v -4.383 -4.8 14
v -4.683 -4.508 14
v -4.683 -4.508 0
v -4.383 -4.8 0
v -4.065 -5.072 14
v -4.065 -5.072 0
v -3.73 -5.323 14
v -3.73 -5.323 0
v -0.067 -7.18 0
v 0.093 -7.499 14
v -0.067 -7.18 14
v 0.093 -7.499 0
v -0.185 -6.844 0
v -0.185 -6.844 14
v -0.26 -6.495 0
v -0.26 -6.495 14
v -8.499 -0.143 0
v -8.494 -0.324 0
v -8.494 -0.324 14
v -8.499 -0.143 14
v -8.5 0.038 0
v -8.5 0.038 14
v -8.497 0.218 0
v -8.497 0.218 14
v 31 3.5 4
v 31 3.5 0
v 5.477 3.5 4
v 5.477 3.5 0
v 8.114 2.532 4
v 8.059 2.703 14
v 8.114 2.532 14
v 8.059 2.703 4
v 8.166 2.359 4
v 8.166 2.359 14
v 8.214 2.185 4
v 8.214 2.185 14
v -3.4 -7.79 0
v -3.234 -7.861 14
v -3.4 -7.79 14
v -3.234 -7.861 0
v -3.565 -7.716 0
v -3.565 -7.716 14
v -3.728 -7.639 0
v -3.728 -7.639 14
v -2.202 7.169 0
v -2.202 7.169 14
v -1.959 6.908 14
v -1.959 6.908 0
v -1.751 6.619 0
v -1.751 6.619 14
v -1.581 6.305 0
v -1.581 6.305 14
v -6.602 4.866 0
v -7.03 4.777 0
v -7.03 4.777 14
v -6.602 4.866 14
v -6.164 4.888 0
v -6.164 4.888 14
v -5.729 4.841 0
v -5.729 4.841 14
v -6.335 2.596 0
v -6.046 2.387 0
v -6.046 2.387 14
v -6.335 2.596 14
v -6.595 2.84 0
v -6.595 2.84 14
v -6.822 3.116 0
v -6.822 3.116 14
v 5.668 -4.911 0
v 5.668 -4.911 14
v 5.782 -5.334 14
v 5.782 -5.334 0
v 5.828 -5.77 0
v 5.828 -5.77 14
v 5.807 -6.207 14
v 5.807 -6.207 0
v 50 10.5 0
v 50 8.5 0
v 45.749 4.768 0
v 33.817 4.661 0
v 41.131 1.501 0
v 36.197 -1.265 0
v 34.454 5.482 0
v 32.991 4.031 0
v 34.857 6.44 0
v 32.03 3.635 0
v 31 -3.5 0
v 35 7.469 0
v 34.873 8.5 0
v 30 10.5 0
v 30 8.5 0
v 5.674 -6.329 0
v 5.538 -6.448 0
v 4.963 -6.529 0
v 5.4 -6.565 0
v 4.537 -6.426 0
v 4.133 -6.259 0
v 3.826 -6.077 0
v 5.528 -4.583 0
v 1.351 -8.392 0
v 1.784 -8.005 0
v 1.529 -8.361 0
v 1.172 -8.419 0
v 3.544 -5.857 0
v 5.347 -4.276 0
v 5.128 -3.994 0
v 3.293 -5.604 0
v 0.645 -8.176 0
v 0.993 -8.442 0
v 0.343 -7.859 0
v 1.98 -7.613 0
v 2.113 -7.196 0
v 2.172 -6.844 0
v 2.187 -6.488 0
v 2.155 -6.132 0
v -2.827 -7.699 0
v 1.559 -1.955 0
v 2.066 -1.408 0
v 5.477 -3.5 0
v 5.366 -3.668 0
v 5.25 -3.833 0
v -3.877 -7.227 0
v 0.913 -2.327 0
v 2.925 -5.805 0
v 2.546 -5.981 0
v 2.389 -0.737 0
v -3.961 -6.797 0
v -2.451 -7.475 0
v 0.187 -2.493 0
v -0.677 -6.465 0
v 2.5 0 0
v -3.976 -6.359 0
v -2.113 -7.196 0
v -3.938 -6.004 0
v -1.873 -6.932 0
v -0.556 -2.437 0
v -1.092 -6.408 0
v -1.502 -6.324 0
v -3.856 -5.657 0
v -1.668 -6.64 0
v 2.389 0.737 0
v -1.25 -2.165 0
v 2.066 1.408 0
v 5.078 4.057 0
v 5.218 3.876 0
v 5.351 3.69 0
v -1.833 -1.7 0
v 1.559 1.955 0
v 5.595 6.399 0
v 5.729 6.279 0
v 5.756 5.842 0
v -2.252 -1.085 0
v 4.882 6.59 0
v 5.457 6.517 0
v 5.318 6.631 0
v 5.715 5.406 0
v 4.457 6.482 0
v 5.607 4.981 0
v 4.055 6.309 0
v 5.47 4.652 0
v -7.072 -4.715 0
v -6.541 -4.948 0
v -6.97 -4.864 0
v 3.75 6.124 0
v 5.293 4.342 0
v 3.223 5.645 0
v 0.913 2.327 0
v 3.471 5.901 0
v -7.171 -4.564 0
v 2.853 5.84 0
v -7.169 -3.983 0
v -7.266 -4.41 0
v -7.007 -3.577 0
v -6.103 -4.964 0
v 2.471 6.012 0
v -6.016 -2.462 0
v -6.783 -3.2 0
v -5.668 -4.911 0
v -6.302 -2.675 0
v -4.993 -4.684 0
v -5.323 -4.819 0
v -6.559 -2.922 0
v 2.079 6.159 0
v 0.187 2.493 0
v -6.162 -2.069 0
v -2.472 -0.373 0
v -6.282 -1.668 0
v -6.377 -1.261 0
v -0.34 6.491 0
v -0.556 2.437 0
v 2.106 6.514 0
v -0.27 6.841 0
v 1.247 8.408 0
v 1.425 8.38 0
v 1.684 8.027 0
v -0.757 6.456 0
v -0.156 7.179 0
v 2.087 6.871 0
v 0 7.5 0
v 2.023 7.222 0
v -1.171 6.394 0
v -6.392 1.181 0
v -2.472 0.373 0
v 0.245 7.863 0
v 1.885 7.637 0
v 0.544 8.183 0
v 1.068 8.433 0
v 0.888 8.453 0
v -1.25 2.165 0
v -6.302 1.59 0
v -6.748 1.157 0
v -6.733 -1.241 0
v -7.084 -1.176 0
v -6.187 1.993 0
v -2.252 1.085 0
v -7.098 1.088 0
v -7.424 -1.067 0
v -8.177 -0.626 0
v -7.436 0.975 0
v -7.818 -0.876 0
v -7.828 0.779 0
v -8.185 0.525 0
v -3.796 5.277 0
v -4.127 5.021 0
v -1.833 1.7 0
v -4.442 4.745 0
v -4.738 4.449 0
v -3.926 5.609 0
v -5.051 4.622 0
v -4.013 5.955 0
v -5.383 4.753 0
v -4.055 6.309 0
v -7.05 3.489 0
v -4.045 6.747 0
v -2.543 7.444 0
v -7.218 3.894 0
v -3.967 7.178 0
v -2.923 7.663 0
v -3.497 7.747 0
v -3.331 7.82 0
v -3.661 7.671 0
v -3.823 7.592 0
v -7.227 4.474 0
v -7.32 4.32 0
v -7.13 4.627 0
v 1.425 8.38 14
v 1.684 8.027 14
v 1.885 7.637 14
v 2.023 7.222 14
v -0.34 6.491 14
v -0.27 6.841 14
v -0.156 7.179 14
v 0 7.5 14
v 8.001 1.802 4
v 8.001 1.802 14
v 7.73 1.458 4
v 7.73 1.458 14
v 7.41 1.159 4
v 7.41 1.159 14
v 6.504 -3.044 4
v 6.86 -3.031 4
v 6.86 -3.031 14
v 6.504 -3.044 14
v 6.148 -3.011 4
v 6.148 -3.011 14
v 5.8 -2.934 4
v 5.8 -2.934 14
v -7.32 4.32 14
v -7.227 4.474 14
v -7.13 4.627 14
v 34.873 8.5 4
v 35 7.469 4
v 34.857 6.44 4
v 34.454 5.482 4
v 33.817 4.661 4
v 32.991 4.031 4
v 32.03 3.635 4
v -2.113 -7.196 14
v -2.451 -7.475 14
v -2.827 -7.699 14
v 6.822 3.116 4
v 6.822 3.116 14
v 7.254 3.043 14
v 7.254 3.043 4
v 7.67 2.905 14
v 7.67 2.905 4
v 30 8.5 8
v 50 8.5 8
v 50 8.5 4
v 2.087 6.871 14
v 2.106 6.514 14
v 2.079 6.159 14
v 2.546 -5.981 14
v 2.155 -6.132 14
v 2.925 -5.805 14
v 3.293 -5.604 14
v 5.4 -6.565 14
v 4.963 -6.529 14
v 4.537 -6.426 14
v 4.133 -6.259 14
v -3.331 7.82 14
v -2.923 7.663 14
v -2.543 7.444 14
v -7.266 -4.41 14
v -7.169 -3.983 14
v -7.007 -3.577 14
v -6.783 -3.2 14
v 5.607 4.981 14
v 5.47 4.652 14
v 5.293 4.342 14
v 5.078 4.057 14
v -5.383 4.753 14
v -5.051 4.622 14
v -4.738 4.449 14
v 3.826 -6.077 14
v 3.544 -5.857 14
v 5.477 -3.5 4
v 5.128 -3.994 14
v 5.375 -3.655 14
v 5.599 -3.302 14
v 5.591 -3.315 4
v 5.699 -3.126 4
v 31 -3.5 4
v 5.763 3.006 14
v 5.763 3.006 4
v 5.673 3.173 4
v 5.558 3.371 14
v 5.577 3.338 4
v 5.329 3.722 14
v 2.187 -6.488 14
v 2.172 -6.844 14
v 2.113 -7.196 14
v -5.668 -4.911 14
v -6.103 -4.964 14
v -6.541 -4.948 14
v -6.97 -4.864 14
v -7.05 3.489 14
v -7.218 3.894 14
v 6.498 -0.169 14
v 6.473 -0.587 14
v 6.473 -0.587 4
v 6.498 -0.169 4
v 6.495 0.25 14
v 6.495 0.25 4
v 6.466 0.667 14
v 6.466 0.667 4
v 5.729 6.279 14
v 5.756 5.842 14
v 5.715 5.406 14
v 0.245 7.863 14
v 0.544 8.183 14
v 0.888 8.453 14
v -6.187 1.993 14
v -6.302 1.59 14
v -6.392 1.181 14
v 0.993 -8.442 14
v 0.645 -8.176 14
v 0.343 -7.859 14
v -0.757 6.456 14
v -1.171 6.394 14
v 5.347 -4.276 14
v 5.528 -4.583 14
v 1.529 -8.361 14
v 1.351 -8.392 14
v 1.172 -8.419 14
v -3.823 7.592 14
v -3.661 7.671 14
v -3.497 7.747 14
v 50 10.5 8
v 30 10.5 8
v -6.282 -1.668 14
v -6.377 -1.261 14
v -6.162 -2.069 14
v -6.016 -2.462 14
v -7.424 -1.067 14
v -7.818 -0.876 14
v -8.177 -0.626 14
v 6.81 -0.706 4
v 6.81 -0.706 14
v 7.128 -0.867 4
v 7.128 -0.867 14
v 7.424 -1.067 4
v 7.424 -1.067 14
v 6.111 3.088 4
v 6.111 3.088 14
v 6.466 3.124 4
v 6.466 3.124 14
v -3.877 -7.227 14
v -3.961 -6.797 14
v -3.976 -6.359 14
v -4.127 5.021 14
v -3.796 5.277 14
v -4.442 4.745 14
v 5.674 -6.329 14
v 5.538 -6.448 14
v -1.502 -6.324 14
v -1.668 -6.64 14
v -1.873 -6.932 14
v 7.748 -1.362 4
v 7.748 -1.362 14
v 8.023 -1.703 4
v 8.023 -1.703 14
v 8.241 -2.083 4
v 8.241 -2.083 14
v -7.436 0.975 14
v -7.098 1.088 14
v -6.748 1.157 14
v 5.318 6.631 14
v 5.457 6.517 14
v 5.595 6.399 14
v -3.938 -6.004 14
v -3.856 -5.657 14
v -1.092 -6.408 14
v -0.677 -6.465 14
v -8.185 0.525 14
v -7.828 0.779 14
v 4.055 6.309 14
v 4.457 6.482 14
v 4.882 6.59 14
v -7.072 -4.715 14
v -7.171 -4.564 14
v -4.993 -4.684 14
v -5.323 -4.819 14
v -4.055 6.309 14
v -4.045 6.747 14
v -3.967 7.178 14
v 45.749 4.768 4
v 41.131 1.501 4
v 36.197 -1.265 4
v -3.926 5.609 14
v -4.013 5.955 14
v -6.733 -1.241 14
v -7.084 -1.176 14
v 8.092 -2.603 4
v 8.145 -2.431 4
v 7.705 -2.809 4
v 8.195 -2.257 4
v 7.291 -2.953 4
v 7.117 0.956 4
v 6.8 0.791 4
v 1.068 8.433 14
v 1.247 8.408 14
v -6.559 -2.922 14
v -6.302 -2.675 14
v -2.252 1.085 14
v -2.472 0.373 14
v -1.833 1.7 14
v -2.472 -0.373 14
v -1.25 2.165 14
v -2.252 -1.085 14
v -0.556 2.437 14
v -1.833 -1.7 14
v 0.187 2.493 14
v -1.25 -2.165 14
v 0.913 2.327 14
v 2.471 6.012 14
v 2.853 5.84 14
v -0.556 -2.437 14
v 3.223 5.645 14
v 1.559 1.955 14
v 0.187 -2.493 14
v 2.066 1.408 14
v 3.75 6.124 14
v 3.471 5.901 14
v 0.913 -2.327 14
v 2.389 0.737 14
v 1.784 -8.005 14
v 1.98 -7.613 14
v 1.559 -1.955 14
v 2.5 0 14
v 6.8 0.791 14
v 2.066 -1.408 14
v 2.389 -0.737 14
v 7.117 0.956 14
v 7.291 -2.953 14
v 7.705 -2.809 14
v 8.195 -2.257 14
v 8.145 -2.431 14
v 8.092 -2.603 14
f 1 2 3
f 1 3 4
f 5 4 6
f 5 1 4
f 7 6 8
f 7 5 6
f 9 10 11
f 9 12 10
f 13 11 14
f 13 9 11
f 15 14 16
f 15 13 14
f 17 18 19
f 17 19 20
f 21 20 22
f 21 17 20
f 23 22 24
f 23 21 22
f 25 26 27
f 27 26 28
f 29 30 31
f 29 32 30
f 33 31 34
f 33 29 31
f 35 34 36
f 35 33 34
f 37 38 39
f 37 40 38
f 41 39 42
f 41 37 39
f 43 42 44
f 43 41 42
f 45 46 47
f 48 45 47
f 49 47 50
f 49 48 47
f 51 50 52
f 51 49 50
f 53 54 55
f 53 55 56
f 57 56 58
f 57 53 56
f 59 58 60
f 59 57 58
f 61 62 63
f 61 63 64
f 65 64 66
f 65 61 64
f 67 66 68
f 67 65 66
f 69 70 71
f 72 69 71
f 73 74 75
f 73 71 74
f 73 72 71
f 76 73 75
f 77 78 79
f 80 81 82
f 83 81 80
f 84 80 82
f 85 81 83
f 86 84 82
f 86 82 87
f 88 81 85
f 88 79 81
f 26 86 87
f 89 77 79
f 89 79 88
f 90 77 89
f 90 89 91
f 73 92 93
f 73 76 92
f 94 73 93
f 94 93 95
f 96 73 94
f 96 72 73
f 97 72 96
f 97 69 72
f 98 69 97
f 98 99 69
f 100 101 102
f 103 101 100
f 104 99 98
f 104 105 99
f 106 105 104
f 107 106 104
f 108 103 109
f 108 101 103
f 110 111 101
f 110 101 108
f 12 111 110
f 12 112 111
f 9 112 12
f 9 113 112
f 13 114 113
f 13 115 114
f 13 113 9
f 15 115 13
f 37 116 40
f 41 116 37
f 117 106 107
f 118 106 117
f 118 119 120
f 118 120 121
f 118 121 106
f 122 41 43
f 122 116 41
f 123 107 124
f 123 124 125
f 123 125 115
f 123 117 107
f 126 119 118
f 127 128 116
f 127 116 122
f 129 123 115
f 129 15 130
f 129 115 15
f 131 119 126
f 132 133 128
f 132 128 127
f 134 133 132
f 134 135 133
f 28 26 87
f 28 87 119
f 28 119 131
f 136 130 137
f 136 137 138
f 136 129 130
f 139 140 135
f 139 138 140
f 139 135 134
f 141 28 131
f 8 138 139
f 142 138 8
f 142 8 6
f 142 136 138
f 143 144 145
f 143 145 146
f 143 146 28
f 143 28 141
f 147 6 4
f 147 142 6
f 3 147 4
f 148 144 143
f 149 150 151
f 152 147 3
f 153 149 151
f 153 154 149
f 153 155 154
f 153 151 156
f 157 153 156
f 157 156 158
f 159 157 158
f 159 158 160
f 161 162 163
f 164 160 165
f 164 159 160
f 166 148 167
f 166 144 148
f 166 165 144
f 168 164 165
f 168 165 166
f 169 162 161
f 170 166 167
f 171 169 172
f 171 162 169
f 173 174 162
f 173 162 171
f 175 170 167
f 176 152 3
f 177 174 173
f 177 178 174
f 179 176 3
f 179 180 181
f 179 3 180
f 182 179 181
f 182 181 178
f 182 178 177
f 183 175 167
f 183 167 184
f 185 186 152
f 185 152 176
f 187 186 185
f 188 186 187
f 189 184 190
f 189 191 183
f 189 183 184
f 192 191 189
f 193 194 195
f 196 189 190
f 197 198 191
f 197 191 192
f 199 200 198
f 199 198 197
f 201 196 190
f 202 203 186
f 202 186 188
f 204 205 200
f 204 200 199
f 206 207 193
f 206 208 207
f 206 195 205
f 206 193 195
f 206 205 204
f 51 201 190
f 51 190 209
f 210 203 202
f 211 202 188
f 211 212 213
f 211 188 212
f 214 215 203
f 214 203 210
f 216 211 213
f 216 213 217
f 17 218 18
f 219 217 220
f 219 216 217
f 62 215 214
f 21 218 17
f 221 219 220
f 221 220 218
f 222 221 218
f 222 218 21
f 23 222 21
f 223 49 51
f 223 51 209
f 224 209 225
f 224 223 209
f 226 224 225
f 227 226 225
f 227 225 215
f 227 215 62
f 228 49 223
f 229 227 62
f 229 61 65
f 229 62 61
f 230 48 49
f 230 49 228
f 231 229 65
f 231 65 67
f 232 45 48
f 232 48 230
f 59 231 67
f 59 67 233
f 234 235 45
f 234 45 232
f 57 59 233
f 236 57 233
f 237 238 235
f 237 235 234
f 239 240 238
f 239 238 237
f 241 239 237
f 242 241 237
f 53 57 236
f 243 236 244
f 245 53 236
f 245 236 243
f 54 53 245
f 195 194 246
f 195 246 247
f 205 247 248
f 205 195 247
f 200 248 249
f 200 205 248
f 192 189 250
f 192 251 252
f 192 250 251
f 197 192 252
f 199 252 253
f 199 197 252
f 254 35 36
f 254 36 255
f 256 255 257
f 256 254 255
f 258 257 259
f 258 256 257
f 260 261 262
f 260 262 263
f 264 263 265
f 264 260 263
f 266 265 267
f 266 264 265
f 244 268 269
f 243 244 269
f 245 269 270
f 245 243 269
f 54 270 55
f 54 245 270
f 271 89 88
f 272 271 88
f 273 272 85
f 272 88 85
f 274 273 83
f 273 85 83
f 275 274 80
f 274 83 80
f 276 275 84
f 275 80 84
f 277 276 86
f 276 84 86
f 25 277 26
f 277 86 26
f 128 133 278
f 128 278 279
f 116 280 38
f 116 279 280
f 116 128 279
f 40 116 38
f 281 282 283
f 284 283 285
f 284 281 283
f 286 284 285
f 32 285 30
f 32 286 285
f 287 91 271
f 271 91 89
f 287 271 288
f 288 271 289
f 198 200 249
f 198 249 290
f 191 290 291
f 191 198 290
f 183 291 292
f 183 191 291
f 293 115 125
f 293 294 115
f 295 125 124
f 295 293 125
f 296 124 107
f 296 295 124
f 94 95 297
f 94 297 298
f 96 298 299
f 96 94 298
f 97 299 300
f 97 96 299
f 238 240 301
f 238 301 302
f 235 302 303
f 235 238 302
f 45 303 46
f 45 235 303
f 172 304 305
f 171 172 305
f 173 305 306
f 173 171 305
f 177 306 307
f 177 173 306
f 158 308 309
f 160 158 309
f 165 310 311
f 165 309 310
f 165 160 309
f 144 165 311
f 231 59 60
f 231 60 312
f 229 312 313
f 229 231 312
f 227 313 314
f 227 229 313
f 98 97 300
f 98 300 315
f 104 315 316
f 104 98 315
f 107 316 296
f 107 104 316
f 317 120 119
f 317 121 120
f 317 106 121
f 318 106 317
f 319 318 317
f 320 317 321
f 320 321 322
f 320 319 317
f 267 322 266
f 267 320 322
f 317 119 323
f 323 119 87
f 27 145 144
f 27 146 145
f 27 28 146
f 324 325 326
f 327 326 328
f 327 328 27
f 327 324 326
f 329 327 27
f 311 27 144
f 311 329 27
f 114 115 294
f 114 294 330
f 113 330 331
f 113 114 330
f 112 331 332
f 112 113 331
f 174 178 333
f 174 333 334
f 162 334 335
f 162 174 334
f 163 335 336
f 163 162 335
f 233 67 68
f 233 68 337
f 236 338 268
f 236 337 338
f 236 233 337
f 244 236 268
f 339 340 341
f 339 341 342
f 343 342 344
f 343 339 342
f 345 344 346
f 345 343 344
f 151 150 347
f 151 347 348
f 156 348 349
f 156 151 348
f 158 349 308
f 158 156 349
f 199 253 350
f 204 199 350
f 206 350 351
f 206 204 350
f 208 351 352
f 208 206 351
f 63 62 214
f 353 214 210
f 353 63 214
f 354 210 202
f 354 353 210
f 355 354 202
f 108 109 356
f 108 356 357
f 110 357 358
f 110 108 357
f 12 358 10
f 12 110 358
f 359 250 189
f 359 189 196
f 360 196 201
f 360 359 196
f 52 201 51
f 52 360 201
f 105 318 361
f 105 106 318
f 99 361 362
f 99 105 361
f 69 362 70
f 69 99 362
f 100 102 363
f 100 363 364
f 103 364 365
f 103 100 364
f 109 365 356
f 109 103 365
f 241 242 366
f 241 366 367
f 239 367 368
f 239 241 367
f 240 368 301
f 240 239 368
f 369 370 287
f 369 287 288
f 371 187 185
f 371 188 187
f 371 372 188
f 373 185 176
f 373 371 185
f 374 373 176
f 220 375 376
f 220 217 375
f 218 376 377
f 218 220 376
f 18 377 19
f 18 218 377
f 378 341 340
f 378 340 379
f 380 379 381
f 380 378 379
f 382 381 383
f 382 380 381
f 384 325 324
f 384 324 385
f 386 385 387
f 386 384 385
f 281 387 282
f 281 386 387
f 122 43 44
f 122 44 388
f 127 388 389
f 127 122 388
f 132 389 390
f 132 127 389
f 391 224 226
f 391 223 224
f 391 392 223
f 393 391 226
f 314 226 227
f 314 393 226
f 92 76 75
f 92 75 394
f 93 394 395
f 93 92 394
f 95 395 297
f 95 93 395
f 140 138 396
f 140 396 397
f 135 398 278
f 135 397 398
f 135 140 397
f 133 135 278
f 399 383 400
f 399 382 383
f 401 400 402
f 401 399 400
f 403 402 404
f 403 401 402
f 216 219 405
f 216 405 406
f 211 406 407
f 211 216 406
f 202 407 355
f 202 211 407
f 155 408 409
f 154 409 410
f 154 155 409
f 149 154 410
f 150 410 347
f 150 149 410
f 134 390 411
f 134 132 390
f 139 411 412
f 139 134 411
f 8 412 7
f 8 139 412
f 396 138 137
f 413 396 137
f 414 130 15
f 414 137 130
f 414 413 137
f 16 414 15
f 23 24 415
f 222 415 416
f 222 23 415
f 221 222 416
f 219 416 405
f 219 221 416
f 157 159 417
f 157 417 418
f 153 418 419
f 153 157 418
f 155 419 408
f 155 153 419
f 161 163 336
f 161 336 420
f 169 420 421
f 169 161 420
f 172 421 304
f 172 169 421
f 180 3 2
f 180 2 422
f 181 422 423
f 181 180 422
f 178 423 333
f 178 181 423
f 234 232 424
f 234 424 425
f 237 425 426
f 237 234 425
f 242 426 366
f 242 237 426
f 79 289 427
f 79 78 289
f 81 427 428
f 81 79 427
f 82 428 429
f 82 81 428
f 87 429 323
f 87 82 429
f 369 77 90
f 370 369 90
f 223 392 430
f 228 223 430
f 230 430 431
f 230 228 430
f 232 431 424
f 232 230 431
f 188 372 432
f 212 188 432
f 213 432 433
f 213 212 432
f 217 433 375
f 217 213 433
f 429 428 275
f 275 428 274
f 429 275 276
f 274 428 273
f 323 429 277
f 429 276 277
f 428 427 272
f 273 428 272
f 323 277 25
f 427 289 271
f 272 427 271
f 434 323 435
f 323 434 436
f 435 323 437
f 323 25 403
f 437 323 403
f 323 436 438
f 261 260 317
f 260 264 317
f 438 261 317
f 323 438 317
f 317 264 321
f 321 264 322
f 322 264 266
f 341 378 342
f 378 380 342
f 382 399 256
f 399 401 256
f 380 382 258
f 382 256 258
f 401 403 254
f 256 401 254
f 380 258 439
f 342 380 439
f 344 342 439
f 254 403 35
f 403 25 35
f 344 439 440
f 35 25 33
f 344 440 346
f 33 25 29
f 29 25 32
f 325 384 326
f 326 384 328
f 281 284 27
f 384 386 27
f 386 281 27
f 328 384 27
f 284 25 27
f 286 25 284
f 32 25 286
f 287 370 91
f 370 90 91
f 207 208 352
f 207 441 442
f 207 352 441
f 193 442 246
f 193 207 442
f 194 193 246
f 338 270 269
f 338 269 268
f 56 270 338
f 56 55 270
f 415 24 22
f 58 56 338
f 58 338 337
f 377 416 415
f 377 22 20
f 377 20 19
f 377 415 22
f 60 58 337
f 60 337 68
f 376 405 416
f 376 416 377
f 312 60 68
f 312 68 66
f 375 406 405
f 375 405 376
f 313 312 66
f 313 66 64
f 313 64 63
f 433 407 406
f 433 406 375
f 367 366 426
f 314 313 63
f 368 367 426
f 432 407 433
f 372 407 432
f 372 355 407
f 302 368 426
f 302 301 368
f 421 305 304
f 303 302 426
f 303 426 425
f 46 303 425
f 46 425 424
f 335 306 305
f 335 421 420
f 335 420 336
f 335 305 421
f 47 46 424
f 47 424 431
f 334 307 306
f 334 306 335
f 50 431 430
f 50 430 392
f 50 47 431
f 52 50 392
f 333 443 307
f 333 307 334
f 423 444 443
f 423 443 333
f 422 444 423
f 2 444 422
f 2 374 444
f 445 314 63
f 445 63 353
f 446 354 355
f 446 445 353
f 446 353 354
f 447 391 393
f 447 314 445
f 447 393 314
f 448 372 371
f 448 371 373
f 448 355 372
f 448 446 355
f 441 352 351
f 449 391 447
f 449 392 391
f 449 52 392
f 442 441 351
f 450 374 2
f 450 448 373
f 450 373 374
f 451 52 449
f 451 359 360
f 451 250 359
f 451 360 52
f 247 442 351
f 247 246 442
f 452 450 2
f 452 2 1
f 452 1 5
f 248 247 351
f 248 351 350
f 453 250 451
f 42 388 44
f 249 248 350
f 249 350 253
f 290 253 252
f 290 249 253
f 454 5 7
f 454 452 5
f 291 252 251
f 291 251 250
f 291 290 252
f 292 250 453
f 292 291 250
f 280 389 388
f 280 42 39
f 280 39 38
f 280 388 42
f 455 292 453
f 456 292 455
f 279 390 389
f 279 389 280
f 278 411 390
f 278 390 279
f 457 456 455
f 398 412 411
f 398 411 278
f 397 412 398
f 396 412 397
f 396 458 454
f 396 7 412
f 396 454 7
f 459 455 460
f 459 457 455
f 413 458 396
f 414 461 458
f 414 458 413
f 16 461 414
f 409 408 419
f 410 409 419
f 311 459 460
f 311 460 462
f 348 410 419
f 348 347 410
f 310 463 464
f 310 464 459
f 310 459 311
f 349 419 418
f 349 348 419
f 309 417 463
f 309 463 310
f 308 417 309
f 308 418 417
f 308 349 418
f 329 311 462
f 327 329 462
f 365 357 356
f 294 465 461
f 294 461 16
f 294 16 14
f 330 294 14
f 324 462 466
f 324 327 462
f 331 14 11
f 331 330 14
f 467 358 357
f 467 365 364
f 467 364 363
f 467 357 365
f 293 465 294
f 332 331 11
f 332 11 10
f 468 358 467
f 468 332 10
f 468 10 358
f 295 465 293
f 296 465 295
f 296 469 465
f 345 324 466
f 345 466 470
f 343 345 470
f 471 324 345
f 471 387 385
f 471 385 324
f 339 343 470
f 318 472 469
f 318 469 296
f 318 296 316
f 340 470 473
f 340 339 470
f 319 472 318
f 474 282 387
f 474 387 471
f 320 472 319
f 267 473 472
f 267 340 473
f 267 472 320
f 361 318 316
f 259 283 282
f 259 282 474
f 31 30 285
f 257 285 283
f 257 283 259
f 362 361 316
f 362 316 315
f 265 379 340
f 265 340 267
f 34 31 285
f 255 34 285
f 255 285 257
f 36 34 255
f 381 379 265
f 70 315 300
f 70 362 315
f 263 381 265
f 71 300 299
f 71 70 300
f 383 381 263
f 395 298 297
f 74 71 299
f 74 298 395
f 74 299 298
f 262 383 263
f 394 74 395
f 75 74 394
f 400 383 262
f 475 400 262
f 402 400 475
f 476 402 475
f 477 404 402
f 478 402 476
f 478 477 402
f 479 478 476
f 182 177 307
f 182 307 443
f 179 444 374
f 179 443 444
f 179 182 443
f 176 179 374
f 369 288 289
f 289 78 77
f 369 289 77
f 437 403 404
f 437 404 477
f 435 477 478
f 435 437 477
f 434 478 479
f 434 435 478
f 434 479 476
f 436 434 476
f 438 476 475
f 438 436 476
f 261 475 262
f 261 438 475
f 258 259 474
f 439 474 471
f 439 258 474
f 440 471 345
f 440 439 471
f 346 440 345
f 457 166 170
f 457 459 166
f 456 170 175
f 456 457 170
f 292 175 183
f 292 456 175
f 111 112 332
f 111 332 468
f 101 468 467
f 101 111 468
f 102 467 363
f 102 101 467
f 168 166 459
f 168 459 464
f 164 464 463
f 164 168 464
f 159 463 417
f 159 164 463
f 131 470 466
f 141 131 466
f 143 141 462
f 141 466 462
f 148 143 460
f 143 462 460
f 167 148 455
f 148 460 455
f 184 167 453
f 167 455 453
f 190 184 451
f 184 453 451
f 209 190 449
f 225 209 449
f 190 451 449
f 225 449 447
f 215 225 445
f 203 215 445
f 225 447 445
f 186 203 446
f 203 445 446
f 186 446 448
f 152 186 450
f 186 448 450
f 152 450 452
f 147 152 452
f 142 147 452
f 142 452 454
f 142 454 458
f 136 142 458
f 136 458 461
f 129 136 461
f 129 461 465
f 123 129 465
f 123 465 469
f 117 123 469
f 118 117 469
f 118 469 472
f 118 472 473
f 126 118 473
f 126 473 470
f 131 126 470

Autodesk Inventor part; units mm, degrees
ref_plane "YZ Plane" through (0, 0, 0) normal (1, 0, 0) x (0, 1, 0)
ref_plane "XZ Plane" through (0, 0, 0) normal (0, 1, 0) x (-1, 0, 0)
ref_plane "XY Plane" through (0, 0, 0) normal (0, 0, 1) x (1, 0, 0)
sketch "Skizze1" plane through (0, 0, 0) normal (0, 0, 1) x (1, 0, 0)
  circle A0 centre (0, 0) radius 7.5
  circle A1 centre (0, 0) radius 2
  circle A2 centre (0, 0) radius 6.5
  circle A3 centre (0, 0) radius 8.5
  line L0 (0, 11.9067) -> (0, -11.9011) projected
  line L1 (-11.9, 0) -> (11.9, 0) projected
  line L2 (0, 0) -> (2.2933, 8.1848)
  line L3 (0, 0) -> (4.4165, 7.2626)
  arc A4 (0, 7.5) -> (-0.3402, 6.4911) centre (2.4347, 6.1172) ccw
  arc A5 (0.8885, 8.4534) -> (0, 7.5) centre (2.4473, 6.1101) ccw
  arc A6 (2.0235, 7.2219) -> (1.4252, 8.3797) centre (-0.708, 6.5438) ccw
  arc A7 (2.0788, 6.1586) -> (2.0235, 7.2219) centre (-0.694, 6.5473) ccw
  line L4 (0, 0) -> (-0.3402, 6.4911)
  line L5 (0, 0) -> (2.0788, 6.1586)
  line L6 (0.8885, 8.4534) -> (0, 0)
  line L7 (0, 0) -> (1.4252, 8.3797)
  arc A8 (0, 7.5) -> (-0.3402, 6.4911) centre (2.4347, 6.1172) ccw
  arc A9 (0.8885, 8.4534) -> (0, 7.5) centre (2.4473, 6.1101) ccw
  arc A10 (2.0235, 7.2219) -> (1.4252, 8.3797) centre (-0.708, 6.5438) ccw
  arc A11 (2.0788, 6.1586) -> (2.0235, 7.2219) centre (-0.694, 6.5473) ccw
  arc A12 (2.0788, 6.1586) -> (-0.3402, 6.4911) centre (0, 0) ccw
  dimension "d0" = 15
  dimension "d1" = 4
  dimension "d2" = 1
  dimension "d3" = 1
  dimension "d4" = 15.652
  dimension "d5" = 15.652
  dimension "d6" = 3
  dimension "d7" = 3
  dimension "d9" = 6
  dimension "d10" = 6
  dimension "d11" = 2.8
  dimension "d12" = 2.8
extrude "Extrusion1" add sketch "Skizze1" along normal blind 14 contours L2 A2 L7 A0 | A7 A2 L2 | A0 L7 A6 | L7 A2 L6 A0 | A0 L6 A3 L7 | L2 A1 L7 A2 | A5 L6 A0 | A0 L6 A2 L0 | L0 A2 A4 | L4 A1 L0 | L7 A1 L2 | L0 A1 L6 | L6 A1 L7 | L7 A1 L6 A2 | L0 A1 L4 A2 | A2 L6 A1 L0
pattern_circular "Runde Anordnung1" count 11 over 360 about axis through (0, 0, -10) along (0, 0, 1) of "Extrusion1"
sketch "Skizze2" plane through (0, 0, 14) normal (0, 0, 1) x (0.8118, 0.5839, 0)
  arc A0 (5.6575, 6.3437) -> (4.3795, 6.0885) centre (5.5546, 3.5312) ccw projected
  arc A1 (6.0501, 5.9705) -> (5.6575, 6.3437) centre (0, 0) ccw projected
  arc A2 (5.8597, 4.6812) -> (6.0501, 5.9705) centre (3.2463, 5.7257) ccw projected
  arc A3 (5.2838, 3.7857) -> (5.8597, 4.6812) centre (3.2597, 5.7204) ccw projected
  arc A4 (5.2838, 3.7857) -> (5.0784, 4.057) centre (0, 0) ccw projected
  line L0 (5.0784, 4.057) -> (0, 0) projected
  line L1 (0, 0) -> (5.9126, 2.7002) projected
  arc A5 (6.9759, 2.7543) -> (5.9126, 2.7002) centre (6.5839, -0.0181) ccw projected
  arc A6 (8.1891, 2.278) -> (6.9759, 2.7543) centre (6.5819, -0.0324) ccw projected
  arc A7 (8.3175, 1.7518) -> (8.1891, 2.278) centre (0, 0) ccw projected
  arc A8 (7.4604, 0.7701) -> (8.3175, 1.7518) centre (5.8266, 3.0617) ccw projected
  arc A9 (6.4917, 0.3281) -> (7.4604, 0.7701) centre (5.8349, 3.05) ccw projected
  arc A10 (6.4917, 0.3281) -> (6.4656, 0.6674) centre (0, 0) ccw projected
  line L2 (6.4656, 0.6674) -> (0, 0) projected
  line L3 (0, 0) -> (-4.9124, -4.2566) projected
  arc A11 (-5.9174, -4.6081) -> (-4.9124, -4.2566) centre (-6.3224, -1.8375) ccw projected
  arc A12 (-7.2155, -4.4929) -> (-5.9174, -4.6081) centre (-6.3244, -1.8233) ccw projected
  arc A13 (-7.4871, -4.0241) -> (-7.2155, -4.4929) centre (0, 0) ccw projected
  arc A14 (-6.9412, -2.8407) -> (-7.4871, -4.0241) centre (-4.728, -4.5792) ccw projected
  arc A15 (-6.1363, -2.1437) -> (-6.9412, -2.8407) centre (-4.7393, -4.5703) ccw projected
  arc A16 (-6.1363, -2.1437) -> (-6.0157, -2.4619) centre (0, 0) ccw projected
  line L4 (-6.0157, -2.4619) -> (0, 0) projected
  line L5 (-6.3918, 1.1812) -> (0, 0) projected
  arc A17 (-6.3212, 1.5141) -> (-6.3918, 1.1812) centre (0, 0) ccw projected
  arc A18 (-6.3212, 1.5141) -> (-7.3751, 1.363) centre (-6.4578, -1.2825) ccw projected
  arc A19 (-7.3751, 1.363) -> (-8.4741, 0.6625) centre (-6.4531, -1.2961) ccw projected
  arc A20 (-8.4741, 0.6625) -> (-8.4991, 0.1214) centre (0, 0) ccw projected
  arc A21 (-8.4991, 0.1214) -> (-7.4693, -0.6774) centre (-6.3062, 1.8854) ccw projected
  arc A22 (-7.4693, -0.6774) -> (-6.4338, -0.925) centre (-6.3121, 1.8723) ccw projected
  line L6 (0, 0) -> (-6.4338, -0.925) projected
  line L7 (-3.7297, -5.3235) -> (0, 0) projected
  arc A23 (-4.0032, -5.121) -> (-3.7297, -5.3235) centre (0, 0) ccw projected
  arc A24 (-4.0032, -5.121) -> (-4.3035, -6.1425) centre (-1.516, -6.4071) ccw projected
  arc A25 (-4.3035, -6.1425) -> (-4.1229, -7.4331) centre (-1.5017, -6.4084) ccw projected
  arc A26 (-4.1229, -7.4331) -> (-3.6411, -7.6807) centre (0, 0) ccw projected
  arc A27 (-3.6411, -7.6807) -> (-2.4867, -7.0757) centre (-4.3347, -4.9531) ccw projected
  arc A28 (-2.4867, -7.0757) -> (-1.8313, -6.2367) centre (-4.3253, -4.9639) ccw projected
  line L8 (0, 0) -> (-1.8313, -6.2367) projected
  arc A29 (4.3795, 6.0885) -> (3.5142, 5.4681) centre (5.5486, 3.5443) ccw projected
  line L9 (0, 0) -> (3.5142, 5.4681) projected
  line L10 (-4.7385, 4.4494) -> (0, 0) projected
  line L11 (0, 0) -> (1.8313, -6.2367) projected
  arc A30 (1.7335, -7.2969) -> (1.8313, -6.2367) centre (-0.9549, -6.5144) ccw projected
  arc A31 (1.0894, -8.4299) -> (1.7335, -7.2969) centre (-0.9688, -6.5103) ccw projected
  arc A32 (0.5502, -8.4822) -> (1.0894, -8.4299) centre (0, 0) ccw projected
  arc A33 (-0.2995, -7.494) -> (0.5502, -8.4822) centre (2.2013, -6.203) ccw projected
  arc A34 (-0.5991, -6.4723) -> (-0.2995, -7.494) centre (2.1885, -6.2096) ccw projected
  arc A35 (-0.5991, -6.4723) -> (-0.2596, -6.4948) centre (0, 0) ccw projected
  line L12 (-0.2596, -6.4948) -> (0, 0) projected
  line L13 (-1.5808, 6.3049) -> (0, 0) projected
  arc A36 (-1.2486, 6.3789) -> (-1.5808, 6.3049) centre (0, 0) ccw projected
  arc A37 (-1.2486, 6.3789) -> (-1.824, 7.2748) centre (-3.8493, 5.3415) ccw projected
  arc A38 (-1.824, 7.2748) -> (-2.9176, 7.9836) centre (-3.8597, 5.3315) ccw projected
  arc A39 (-2.9176, 7.9836) -> (-3.4203, 7.7815) centre (0, 0) ccw projected
  arc A40 (-3.4203, 7.7815) -> (-3.719, 6.513) centre (-0.9047, 6.5195) ccw projected
  arc A41 (-3.719, 6.513) -> (-3.5142, 5.4681) centre (-0.919, 6.5195) ccw projected
  line L14 (0, 0) -> (-3.5142, 5.4681) projected
  line L15 (3.293, -5.6041) -> (0, 0) projected
  arc A42 (2.9952, -5.7688) -> (3.293, -5.6041) centre (0, 0) ccw projected
  arc A43 (2.9952, -5.7688) -> (3.7996, -6.4663) centre (5.1983, -4.0406) ccw projected
  arc A44 (3.7996, -6.4663) -> (5.0487, -6.8382) centre (5.2055, -4.0282) ccw projected
  arc A45 (5.0487, -6.8382) -> (5.474, -6.5027) centre (0, 0) ccw projected
  arc A46 (5.474, -6.5027) -> (5.4033, -5.2014) centre (2.7048, -6.0006) ccw projected
  arc A47 (5.4033, -5.2014) -> (4.9124, -4.2566) centre (2.7186, -5.9965) ccw projected
  line L16 (0, 0) -> (4.9124, -4.2566) projected
  arc A48 (-4.4991, 4.6913) -> (-4.7385, 4.4494) centre (0, 0) ccw projected
  arc A49 (-4.4991, 4.6913) -> (-5.4675, 5.1339) centre (-6.1261, 2.4124) ccw projected
  arc A50 (-5.4675, 5.1339) -> (-6.7707, 5.1388) centre (-6.1295, 2.3984) ccw projected
  arc A51 (-6.7707, 5.1388) -> (-7.0843, 4.6971) centre (0, 0) ccw projected
  arc A52 (-7.0843, 4.6971) -> (-6.6498, 3.4684) centre (-4.2858, 4.9955) ccw projected
  arc A53 (-6.6498, 3.4684) -> (-5.9126, 2.7002) centre (-4.2979, 4.9877) ccw projected
  line L17 (0, 0) -> (-5.9126, 2.7002) projected
  line L18 (2.0788, 6.1586) -> (0, 0) projected
  line L19 (0, 0) -> (6.4338, -0.925) projected
  arc A54 (7.3576, -1.4544) -> (6.4338, -0.925) centre (5.529, -3.5748) ccw projected
  arc A55 (8.1207, -2.5109) -> (7.3576, -1.4544) centre (5.5196, -3.5857) ccw projected
  arc A56 (7.9442, -3.0231) -> (8.1207, -2.5109) centre (0, 0) ccw projected
  arc A57 (6.6924, -3.3856) -> (7.9442, -3.0231) centre (6.5569, -0.5744) ccw projected
  arc A58 (5.6386, -3.2337) -> (6.6924, -3.3856) centre (6.5576, -0.5888) ccw projected
  arc A59 (5.6386, -3.2337) -> (5.8001, -2.9341) centre (0, 0) ccw projected
  line L20 (5.8001, -2.9341) -> (0, 0) projected
  arc A60 (2.3983, 6.0414) -> (2.0788, 6.1586) centre (0, 0) ccw projected
  arc A61 (2.3983, 6.0414) -> (2.3987, 7.1061) centre (-0.3504, 6.5746) ccw projected
  arc A62 (2.3987, 7.1061) -> (1.8618, 8.2936) centre (-0.3646, 6.5719) ccw projected
  arc A63 (1.8618, 8.2936) -> (1.3297, 8.3954) centre (0, 0) ccw projected
  arc A64 (1.3297, 8.3954) -> (0.3925, 7.4897) centre (2.7637, 5.9737) ccw projected
  arc A65 (0.3925, 7.4897) -> (0, 6.5) centre (2.7516, 5.9814) ccw projected
  line L21 (0, 0) -> (0, 6.5) projected
  circle A66 centre (0, 0) radius 6.5
extrude "Extrusion2" add sketch "Skizze2" against normal blind 14 contours A66 L0 L9 | L9 L18 A60 A66 | L0 A4 A66 L1 | L1 A66 L2 | L7 A23 A66 L3 | L3 A66 L4 | L6 A66 L5 | L4 A16 A66 L6 | L8 A66 L7 | L12 A35 A66 L8 | L17 A66 L10 | L15 A42 A66 L11 | L11 A66 L12 | L14 A66 L13 | L10 A48 A66 L14 | L16 A66 L15 | L20 A59 A66 L16 | L5 A17 A66 L17 | L21 A66 L18 | L2 A10 A66 L19 | L19 A66 L20 | L13 A36 A66 L21
sketch "Skizze3" plane through (0, 0, 0) normal (0, 0, -1) x (-1, 0, 0)
  line L0 (0, -19.7919) -> (0, 59.2516) projected
  line L1 (-62.4254, 0) -> (20.3695, 0) projected
  arc A0 (0, 7.5) -> (-0.8885, 8.4534) centre (-2.4473, 6.1101) ccw projected
  arc A1 (0.3402, 6.4911) -> (0, 7.5) centre (-2.4347, 6.1172) ccw projected
  arc A2 (1.5808, 6.3049) -> (0.3402, 6.4911) centre (0, 0) ccw projected
  arc A3 (2.2022, 7.1694) -> (1.5808, 6.3049) centre (4.1236, 5.1327) ccw projected
  arc A4 (3.3315, 7.8199) -> (2.2022, 7.1694) centre (4.1335, 5.1222) ccw projected
  arc A5 (3.8228, 7.5918) -> (3.3315, 7.8199) centre (0, 0) ccw projected
  arc A6 (4.0548, 6.3094) -> (3.8228, 7.5918) centre (1.2446, 6.4633) ccw projected
  arc A7 (3.7955, 5.2767) -> (4.0548, 6.3094) centre (1.259, 6.4625) ccw projected
  arc A8 (4.7385, 4.4494) -> (3.7955, 5.2767) centre (0, 0) ccw projected
  arc A9 (5.7287, 4.8407) -> (4.7385, 4.4494) centre (6.2439, 2.0885) ccw projected
  arc A10 (7.0304, 4.7774) -> (5.7287, 4.8407) centre (6.2466, 2.0744) ccw projected
  arc A11 (7.3204, 4.3199) -> (7.0304, 4.7774) centre (0, 0) ccw projected
  arc A12 (6.8222, 3.1156) -> (7.3204, 4.3199) centre (4.5413, 4.7644) ccw projected
  arc A13 (6.0458, 2.3871) -> (6.8222, 3.1156) centre (4.553, 4.7559) ccw projected
  arc A14 (6.3918, 1.1812) -> (6.0458, 2.3871) centre (0, 0) ccw projected
  arc A15 (7.4363, 0.9751) -> (6.3918, 1.1812) centre (6.3819, -1.6188) ccw projected
  arc A16 (8.4972, 0.2181) -> (7.4363, 0.9751) centre (6.3765, -1.6321) ccw projected
  arc A17 (8.4938, -0.3236) -> (8.4972, 0.2181) centre (0, 0) ccw projected
  arc A18 (7.4237, -1.0674) -> (8.4938, -0.3236) centre (6.3962, 1.5528) ccw projected
  arc A19 (6.3766, -1.2605) -> (7.4237, -1.0674) centre (6.4015, 1.5394) ccw projected
  arc A20 (6.0157, -2.4619) -> (6.3766, -1.2605) centre (0, 0) ccw projected
  arc A21 (6.783, -3.2001) -> (6.0157, -2.4619) centre (4.4936, -4.8121) ccw projected
  arc A22 (7.2662, -4.4104) -> (6.783, -3.2001) centre (4.4818, -4.8204) ccw projected
  arc A23 (6.9705, -4.8643) -> (7.2662, -4.4104) centre (0, 0) ccw projected
  arc A24 (5.6681, -4.9115) -> (6.9705, -4.8643) centre (6.2204, -2.1518) ccw projected
  arc A25 (4.6829, -4.5079) -> (5.6681, -4.9115) centre (6.2175, -2.1659) ccw projected
  arc A26 (3.7297, -5.3235) -> (4.6829, -4.5079) centre (0, 0) ccw projected
  arc A27 (3.9761, -6.3593) -> (3.7297, -5.3235) centre (1.1787, -6.4776) ccw projected
  arc A28 (3.7283, -7.6387) -> (3.9761, -6.3593) centre (1.1643, -6.4782) ccw projected
  arc A29 (3.2341, -7.8607) -> (3.7283, -7.6387) centre (0, 0) ccw projected
  arc A30 (2.113, -7.1962) -> (3.2341, -7.8607) centre (4.0696, -5.1732) ccw projected
  arc A31 (1.5023, -6.324) -> (2.113, -7.1962) centre (4.0595, -5.1835) ccw projected
  arc A32 (0.2596, -6.4948) -> (1.5023, -6.324) centre (0, 0) ccw projected
  arc A33 (-0.0931, -7.4994) -> (0.2596, -6.4948) centre (-2.5105, -6.0865) ccw projected
  arc A34 (-0.9934, -8.4418) -> (-0.0931, -7.4994) centre (-2.5229, -6.0793) ccw projected
  arc A35 (-1.5291, -8.3613) -> (-0.9934, -8.4418) centre (0, 0) ccw projected
  arc A36 (-2.113, -7.1962) -> (-1.5291, -8.3613) centre (0.6267, -6.5521) ccw projected
  arc A37 (-2.1552, -6.1323) -> (-2.113, -7.1962) centre (0.6127, -6.5554) ccw projected
  arc A38 (-3.293, -5.6041) -> (-2.1552, -6.1323) centre (0, 0) ccw projected
  arc A39 (-4.1328, -6.2586) -> (-3.293, -5.6041) centre (-5.4026, -3.763) ccw projected
  arc A40 (-5.3996, -6.5646) -> (-4.1328, -6.2586) centre (-5.4091, -3.7502) ccw projected
  arc A41 (-5.8068, -6.2073) -> (-5.3996, -6.5646) centre (0, 0) ccw projected
  arc A42 (-5.6681, -4.9115) -> (-5.8068, -6.2073) centre (-3.0151, -5.8508) ccw projected
  arc A43 (-5.1284, -3.9937) -> (-5.6681, -4.9115) centre (-3.0287, -5.846) ccw projected
  arc A44 (-5.8001, -2.9341) -> (-5.1284, -3.9937) centre (0, 0) ccw projected
  arc A45 (-6.8604, -3.0307) -> (-5.8001, -2.9341) centre (-6.5794, -0.2448) ccw projected
  arc A46 (-8.0916, -2.6032) -> (-6.8604, -3.0307) centre (-6.578, -0.2305) ccw projected
  arc A47 (-8.2409, -2.0825) -> (-8.0916, -2.6032) centre (0, 0) ccw projected
  arc A48 (-7.4237, -1.0674) -> (-8.2409, -2.0825) centre (-5.6997, -3.2919) ccw projected
  arc A49 (-6.4734, -0.5871) -> (-7.4237, -1.0674) centre (-5.7085, -3.2805) ccw projected
  arc A50 (-6.4656, 0.6674) -> (-6.4734, -0.5871) centre (0, 0) ccw projected
  arc A51 (-7.4098, 1.1595) -> (-6.4656, 0.6674) centre (-5.6673, 3.3512) ccw projected
  arc A52 (-8.2145, 2.1847) -> (-7.4098, 1.1595) centre (-5.6583, 3.3624) ccw projected
  arc A53 (-8.0586, 2.7035) -> (-8.2145, 2.1847) centre (0, 0) ccw projected
  arc A54 (-6.8222, 3.1156) -> (-8.0586, 2.7035) centre (-6.5746, 0.3121) ccw projected
  arc A55 (-5.7632, 3.0059) -> (-6.8222, 3.1156) centre (-6.5759, 0.3265) ccw projected
  arc A56 (-5.0784, 4.057) -> (-5.7632, 3.0059) centre (0, 0) ccw projected
  arc A57 (-5.6067, 4.9815) -> (-5.0784, 4.057) centre (-2.9559, 5.8832) ccw projected
  arc A58 (-5.7293, 6.2789) -> (-5.6067, 4.9815) centre (-2.9422, 5.8878) ccw projected
  arc A59 (-5.3177, 6.6311) -> (-5.7293, 6.2789) centre (0, 0) ccw projected
  arc A60 (-4.0548, 6.3094) -> (-5.3177, 6.6311) centre (-5.3622, 3.8171) ccw projected
  arc A61 (-3.2232, 5.6446) -> (-4.0548, 6.3094) centre (-5.3555, 3.8298) ccw projected
  arc A62 (-2.0788, 6.1586) -> (-3.2232, 5.6446) centre (0, 0) ccw projected
  arc A63 (-2.0235, 7.2219) -> (-2.0788, 6.1586) centre (0.694, 6.5473) ccw projected
  arc A64 (-1.4252, 8.3797) -> (-2.0235, 7.2219) centre (0.708, 6.5438) ccw projected
  arc A65 (-0.8885, 8.4534) -> (-1.4252, 8.3797) centre (0, 0) ccw projected
  circle A66 centre (0, 0) radius 3.5
  line L2 (-50, 10.5) -> (-30, 10.5)
  line L3 (-30, 10.5) -> (-30, 8.5)
  line L4 (-30, 8.5) -> (-50, 8.5)
  line L5 (-50, 8.5) -> (-50, 10.5)
  circle A67 centre (0, 0) radius 8.5
  arc A68 (-5.3177, 6.6311) -> (-5.7293, 6.2789) centre (0, 0) ccw projected
  line L6 (0, -3.5) -> (-31, -3.5)
  line L7 (-31, -3.5) -> (-31, 3.5)
  line L8 (-31, 3.5) -> (0, 3.5)
  line L9 (0, 3.5) -> (0, -3.5)
  arc A69 (-34.873, 8.5) -> (-31, 3.5) centre (-31, 7.5) ccw
  arc A70 (-50, 8.5) -> (-31, -3.5) centre (-12.2955, 47.1571) ccw
  dimension "d24" = 7
  dimension "d20" = 2
  dimension "d21" = 0
  dimension "d22" = 50
  dimension "d23" = 30
  dimension "d25" = 54
  dimension "d26" = 7
  dimension "d27" = 4
  dimension "d28" = 31
extrude "Extrusion3" add sketch "Skizze3" against normal blind 4 contours A66 L1 L0 | L0 L1 A66 | A66 L1 A50 A51 A52 A53 A54 A55 A56 L8 | L1 A66 L0 | L0 A66 L1 | A66 L6 A44 A45 A46 A47 A48 A49 A50 L1 | A56 A55 A54 A67 L8 | A50 A49 A48 A67 L1 | L1 A67 A52 A51 A50 | A67 A53 L1 L7 L8 | L6 A67 A46 A45 A44 | A67 A47 L6 L7 L1 | L7 L1 A70 L4 A69 | L7 A70 L1 | L4 L5 L2 L3
sketch "Skizze4" plane through (0, 0, 14) normal (0, 0, 1) x (1, 0, 0)
  circle A0 centre (0, 0) radius 2.5
  dimension "d31" = 5
extrude "Extrusion4" cut sketch "Skizze4" against normal through all
sketch "Skizze5" plane through (0, 0, 4) normal (0, 0, 1) x (1, 0, 0)
  line L0 (30, 8.5) -> (50, 8.5)
  line L1 (50, 8.5) -> (50, 10.5)
  line L2 (50, 10.5) -> (30, 10.5)
  line L3 (30, 10.5) -> (30, 8.5)
  point P0 (0, 0)
extrude "Extrusion5" add sketch "Skizze5" along normal blind 4
equation "\"d5\" = d4"
equation "\"d7\" = d6"
equation "\"d12\" = d11"
properties part number "Greifer2" material "ABS-Kunststoff"
